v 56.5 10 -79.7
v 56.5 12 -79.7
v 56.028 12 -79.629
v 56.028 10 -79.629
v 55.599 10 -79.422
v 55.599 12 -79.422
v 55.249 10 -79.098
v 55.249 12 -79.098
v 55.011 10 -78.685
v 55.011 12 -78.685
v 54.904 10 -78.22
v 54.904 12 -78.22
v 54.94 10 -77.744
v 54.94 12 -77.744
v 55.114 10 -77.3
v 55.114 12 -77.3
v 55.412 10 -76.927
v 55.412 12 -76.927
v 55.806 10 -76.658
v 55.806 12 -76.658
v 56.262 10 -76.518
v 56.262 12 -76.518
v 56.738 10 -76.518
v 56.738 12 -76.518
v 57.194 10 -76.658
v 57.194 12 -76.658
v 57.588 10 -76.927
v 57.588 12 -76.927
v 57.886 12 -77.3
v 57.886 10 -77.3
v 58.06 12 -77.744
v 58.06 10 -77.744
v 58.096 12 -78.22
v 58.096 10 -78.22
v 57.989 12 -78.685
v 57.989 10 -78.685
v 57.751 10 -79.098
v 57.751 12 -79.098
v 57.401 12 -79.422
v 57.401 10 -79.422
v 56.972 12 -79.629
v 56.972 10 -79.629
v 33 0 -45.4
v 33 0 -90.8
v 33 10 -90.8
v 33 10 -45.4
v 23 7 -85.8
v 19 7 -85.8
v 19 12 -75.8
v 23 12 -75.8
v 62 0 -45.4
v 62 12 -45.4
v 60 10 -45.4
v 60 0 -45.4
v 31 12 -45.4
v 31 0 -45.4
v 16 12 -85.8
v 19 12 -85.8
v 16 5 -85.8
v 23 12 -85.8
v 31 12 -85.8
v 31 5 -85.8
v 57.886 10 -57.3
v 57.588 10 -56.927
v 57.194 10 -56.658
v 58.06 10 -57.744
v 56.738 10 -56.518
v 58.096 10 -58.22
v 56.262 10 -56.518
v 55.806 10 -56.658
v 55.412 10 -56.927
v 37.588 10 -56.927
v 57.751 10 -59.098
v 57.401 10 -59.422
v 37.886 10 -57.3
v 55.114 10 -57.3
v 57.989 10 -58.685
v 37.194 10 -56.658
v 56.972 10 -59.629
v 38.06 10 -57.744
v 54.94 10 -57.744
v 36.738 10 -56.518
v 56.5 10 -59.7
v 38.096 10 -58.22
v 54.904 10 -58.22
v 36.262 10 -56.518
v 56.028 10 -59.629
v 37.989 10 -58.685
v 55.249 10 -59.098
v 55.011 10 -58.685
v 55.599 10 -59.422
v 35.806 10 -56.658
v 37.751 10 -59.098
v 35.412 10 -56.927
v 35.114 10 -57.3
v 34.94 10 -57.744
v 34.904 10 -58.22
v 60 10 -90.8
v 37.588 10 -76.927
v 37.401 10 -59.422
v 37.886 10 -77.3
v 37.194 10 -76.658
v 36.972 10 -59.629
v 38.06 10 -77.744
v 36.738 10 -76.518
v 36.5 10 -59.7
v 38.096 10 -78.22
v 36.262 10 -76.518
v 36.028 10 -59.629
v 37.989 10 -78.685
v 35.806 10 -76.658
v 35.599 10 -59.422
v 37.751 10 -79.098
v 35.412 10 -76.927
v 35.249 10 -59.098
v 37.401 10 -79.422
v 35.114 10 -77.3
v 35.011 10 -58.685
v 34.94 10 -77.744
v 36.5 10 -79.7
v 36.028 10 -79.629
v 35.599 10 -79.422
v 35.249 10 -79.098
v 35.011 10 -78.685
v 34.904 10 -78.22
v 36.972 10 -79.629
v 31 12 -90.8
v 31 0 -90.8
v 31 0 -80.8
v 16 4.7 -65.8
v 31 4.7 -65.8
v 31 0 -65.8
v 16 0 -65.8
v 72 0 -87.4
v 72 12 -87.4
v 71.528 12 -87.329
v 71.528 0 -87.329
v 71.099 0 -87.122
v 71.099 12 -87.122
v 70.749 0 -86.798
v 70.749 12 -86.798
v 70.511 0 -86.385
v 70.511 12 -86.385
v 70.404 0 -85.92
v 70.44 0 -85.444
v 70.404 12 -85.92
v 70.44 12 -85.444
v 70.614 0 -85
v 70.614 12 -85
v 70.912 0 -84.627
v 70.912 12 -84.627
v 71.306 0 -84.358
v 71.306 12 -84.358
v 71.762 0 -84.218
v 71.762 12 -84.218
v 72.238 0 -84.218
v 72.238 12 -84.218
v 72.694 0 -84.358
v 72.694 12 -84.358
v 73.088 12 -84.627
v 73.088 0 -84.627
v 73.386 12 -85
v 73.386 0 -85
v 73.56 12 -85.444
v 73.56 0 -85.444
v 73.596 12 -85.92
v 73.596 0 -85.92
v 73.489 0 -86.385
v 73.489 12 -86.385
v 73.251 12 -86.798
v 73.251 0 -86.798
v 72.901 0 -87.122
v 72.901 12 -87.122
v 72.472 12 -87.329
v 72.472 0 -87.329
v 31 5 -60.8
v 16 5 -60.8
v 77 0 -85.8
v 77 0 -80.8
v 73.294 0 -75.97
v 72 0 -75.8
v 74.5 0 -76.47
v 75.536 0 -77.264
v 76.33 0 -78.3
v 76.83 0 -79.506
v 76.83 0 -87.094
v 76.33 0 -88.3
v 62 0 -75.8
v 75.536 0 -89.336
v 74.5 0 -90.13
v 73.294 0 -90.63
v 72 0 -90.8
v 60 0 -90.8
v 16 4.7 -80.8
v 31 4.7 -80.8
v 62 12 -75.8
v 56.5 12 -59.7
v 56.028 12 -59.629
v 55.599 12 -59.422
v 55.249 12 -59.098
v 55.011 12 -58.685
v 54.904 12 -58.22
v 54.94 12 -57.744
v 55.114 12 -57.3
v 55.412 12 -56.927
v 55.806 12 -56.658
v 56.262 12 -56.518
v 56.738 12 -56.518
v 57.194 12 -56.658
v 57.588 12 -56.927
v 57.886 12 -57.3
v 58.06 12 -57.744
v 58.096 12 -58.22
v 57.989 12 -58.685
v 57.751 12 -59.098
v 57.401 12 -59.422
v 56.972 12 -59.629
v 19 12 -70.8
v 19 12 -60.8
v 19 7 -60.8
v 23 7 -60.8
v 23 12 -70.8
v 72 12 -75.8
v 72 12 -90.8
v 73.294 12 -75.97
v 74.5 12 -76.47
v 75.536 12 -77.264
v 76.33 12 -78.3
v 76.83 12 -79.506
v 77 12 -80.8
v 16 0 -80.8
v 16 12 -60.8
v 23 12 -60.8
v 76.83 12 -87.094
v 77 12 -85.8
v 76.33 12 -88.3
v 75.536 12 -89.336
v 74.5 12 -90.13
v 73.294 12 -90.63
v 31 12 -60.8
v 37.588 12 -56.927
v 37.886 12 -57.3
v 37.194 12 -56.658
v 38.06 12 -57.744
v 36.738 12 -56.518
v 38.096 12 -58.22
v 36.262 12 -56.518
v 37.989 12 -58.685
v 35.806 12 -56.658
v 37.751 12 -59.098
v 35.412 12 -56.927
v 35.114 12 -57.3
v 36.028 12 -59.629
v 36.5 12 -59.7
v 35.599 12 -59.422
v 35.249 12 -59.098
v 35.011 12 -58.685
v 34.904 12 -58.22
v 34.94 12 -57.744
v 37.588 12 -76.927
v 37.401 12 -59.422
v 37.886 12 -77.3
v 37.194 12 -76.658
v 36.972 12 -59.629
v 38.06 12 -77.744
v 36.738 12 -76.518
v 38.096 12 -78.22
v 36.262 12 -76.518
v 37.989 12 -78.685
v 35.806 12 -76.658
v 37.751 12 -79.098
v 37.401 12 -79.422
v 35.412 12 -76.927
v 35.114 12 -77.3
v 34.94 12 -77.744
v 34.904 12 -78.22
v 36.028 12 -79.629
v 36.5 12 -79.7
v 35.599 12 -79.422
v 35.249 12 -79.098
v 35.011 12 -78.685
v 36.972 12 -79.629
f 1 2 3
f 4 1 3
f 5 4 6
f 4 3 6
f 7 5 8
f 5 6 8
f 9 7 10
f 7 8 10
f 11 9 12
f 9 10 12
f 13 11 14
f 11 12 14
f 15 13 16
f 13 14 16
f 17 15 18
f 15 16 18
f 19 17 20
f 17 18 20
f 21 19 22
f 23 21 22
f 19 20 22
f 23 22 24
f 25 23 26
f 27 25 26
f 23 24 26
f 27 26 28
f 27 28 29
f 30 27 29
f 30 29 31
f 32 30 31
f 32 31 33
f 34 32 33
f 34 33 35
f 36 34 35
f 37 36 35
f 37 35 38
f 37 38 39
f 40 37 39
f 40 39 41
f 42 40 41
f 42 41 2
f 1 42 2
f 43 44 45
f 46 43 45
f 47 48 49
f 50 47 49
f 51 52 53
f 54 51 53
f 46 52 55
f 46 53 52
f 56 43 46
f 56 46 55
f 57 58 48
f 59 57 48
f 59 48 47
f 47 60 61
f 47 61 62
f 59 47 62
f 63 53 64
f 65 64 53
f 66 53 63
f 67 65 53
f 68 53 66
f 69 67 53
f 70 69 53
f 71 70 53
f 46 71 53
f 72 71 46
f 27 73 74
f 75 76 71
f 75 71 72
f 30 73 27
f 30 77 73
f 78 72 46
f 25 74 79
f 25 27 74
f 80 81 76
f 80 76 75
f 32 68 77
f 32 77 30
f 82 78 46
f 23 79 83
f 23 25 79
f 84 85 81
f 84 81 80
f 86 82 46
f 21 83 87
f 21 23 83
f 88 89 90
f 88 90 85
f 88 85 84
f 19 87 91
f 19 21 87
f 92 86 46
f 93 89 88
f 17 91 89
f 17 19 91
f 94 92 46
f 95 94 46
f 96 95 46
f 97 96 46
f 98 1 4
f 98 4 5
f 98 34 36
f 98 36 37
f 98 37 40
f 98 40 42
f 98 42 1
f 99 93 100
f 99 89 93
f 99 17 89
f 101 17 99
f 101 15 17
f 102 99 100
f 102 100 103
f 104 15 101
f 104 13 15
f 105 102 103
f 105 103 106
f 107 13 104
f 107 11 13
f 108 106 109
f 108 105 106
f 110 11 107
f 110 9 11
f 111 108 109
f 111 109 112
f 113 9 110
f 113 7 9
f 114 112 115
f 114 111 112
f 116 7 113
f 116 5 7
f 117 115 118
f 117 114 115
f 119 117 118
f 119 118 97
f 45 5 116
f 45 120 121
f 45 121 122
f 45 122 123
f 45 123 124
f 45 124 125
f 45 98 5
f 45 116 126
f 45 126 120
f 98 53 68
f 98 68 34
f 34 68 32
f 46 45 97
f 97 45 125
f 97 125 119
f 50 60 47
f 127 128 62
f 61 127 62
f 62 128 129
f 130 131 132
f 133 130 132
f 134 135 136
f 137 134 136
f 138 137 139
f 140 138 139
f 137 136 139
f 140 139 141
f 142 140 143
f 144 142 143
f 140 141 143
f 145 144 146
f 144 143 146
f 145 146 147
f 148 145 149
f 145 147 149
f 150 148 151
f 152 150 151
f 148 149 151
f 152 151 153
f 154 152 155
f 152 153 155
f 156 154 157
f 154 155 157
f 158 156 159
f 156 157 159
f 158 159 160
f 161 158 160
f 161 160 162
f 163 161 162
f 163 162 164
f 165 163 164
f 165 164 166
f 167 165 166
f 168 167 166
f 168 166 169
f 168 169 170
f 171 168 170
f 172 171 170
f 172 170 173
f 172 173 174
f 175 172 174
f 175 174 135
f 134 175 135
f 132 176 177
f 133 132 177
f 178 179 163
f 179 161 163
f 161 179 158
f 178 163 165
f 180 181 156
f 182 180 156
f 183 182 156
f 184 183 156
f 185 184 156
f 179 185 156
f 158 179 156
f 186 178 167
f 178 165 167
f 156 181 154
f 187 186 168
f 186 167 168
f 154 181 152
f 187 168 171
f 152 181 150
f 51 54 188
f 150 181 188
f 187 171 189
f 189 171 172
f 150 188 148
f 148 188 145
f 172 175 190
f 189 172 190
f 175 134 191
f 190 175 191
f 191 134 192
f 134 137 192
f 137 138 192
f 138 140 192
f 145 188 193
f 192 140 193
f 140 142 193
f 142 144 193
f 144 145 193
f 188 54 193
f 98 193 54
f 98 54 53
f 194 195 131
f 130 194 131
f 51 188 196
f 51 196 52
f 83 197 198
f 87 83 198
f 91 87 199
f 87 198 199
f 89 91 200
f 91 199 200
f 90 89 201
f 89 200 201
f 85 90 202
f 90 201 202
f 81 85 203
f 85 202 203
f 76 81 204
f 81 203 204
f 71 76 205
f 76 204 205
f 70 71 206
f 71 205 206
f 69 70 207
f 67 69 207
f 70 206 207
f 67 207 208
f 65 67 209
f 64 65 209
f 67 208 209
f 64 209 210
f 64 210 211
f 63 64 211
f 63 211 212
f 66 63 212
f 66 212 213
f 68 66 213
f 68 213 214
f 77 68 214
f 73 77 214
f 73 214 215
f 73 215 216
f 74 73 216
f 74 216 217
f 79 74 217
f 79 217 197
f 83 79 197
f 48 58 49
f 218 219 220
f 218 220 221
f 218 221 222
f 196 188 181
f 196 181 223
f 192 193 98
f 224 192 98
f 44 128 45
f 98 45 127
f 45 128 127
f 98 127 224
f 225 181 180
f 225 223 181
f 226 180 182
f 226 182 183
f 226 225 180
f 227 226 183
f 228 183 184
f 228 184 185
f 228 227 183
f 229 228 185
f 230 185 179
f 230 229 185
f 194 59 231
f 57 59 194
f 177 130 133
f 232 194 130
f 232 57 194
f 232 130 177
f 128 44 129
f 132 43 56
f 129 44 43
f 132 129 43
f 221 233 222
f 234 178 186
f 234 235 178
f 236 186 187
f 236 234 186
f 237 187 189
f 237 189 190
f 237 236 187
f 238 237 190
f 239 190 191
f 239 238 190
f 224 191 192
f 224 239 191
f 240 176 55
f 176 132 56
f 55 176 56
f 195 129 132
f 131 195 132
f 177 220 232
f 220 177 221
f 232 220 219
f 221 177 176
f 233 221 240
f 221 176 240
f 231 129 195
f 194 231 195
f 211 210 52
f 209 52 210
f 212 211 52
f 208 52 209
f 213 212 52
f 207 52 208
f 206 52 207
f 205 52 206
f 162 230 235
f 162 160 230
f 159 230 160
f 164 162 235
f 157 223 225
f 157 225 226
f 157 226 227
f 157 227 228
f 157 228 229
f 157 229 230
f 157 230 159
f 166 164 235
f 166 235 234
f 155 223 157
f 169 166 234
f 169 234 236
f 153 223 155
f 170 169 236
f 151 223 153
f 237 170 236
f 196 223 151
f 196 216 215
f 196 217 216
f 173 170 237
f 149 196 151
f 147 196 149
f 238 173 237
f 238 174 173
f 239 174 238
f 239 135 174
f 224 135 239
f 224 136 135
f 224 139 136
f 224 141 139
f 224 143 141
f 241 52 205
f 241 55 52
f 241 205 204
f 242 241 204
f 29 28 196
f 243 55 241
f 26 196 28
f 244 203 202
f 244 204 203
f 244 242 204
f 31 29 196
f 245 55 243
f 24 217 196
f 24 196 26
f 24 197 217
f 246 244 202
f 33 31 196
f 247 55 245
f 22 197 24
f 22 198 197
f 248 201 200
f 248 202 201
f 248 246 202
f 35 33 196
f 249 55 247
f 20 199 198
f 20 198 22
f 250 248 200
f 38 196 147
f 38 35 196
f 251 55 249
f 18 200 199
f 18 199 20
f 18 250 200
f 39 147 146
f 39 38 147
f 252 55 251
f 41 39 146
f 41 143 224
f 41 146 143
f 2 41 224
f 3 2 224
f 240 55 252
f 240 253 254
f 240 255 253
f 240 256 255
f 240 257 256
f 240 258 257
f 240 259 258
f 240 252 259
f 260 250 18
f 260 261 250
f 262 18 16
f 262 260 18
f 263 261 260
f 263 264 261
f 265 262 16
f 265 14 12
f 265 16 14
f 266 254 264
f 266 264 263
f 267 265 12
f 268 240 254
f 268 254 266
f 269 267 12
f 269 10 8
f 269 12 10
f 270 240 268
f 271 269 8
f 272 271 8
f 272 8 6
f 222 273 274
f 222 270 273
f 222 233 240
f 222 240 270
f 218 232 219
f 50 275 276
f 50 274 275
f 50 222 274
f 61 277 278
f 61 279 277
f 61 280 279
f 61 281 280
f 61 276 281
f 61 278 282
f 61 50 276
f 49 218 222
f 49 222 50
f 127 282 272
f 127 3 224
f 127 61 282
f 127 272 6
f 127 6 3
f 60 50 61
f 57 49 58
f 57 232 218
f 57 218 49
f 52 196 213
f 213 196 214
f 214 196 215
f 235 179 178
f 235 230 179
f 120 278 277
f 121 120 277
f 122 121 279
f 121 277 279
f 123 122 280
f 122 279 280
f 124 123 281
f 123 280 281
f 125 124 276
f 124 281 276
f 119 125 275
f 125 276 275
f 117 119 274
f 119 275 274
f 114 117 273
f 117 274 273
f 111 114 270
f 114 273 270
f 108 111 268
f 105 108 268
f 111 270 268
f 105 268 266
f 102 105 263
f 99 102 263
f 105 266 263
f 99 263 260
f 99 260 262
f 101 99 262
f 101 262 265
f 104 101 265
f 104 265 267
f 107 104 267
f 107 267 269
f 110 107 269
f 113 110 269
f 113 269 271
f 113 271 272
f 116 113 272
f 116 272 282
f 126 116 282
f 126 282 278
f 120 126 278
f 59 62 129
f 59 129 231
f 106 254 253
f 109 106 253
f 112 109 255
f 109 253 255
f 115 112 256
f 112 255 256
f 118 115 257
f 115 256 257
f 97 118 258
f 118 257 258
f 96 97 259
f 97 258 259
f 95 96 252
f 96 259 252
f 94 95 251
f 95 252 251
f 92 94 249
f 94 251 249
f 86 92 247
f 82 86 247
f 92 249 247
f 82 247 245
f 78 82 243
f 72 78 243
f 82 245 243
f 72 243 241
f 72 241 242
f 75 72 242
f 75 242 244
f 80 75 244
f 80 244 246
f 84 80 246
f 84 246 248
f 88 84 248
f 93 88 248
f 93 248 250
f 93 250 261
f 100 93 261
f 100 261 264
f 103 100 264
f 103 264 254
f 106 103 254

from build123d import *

# Parameters (mm, degrees)
SKETCH1_W           = 31
SKETCH1_H           = 45.4
BOSS_EXTRUDE1_DEPTH = 12
SKETCH2_W           = 27
SKETCH2_H           = 10
CUT_EXTRUDE1_DEPTH  = 57.268641356
SKETCH3_R           = 1.6
CUT_EXTRUDE2_DEPTH  = 10
SKETCH4_W           = 15
SKETCH4_H           = 12
BOSS_EXTRUDE2_DEPTH = 15
SKETCH5_R           = 1.6
CUT_EXTRUDE3_DEPTH  = 20
FILLET1_R           = 5
BOSS_EXTRUDE3_DEPTH = 15
CHAMFER1_SIZE       = 5
CUT_EXTRUDE4_DEPTH  = 4


with BuildPart() as part:
    # Sketch1 → Boss-Extrude1 (new body)
    with BuildSketch(Plane(origin=(0, 0, 0), x_dir=(1, 0, 0), z_dir=(0, 1, 0))):
        with Locations((15.5, 22.7)):
            Rectangle(SKETCH1_W, SKETCH1_H)
    extrude(amount=BOSS_EXTRUDE1_DEPTH)

    # Sketch2 → Cut-Extrude1 (cut, through all)
    with BuildSketch(Plane.XY):
        with Locations((15.5, 5)):
            Rectangle(SKETCH2_W, SKETCH2_H)
    extrude(amount=-CUT_EXTRUDE1_DEPTH, mode=Mode.SUBTRACT)

    # Sketch3 → Cut-Extrude2 (cut)
    with BuildSketch(Plane(origin=(0, 12, 0), x_dir=(1, 0, 0), z_dir=(0, 1, 0))):
        with Locations(Location((5.5, 32.7, 0), (0, 0, 270))):
            Circle(SKETCH3_R)
        with Locations(Location((25.5, 32.7, 0), (0, 0, 270))):
            Circle(SKETCH3_R)
        with Locations(Location((25.5, 12.7, 0), (0, 0, 270))):
            Circle(SKETCH3_R)
        with Locations(Location((5.5, 12.7, 0), (0, 0, 270))):
            Circle(SKETCH3_R)
    extrude(amount=-CUT_EXTRUDE2_DEPTH, mode=Mode.SUBTRACT)

    # Sketch4 → Boss-Extrude2 (add)
    with BuildSketch(Plane.ZY):
        with Locations((-7.5, 6)):
            Rectangle(SKETCH4_W, SKETCH4_H)
    extrude(amount=BOSS_EXTRUDE2_DEPTH)

    # Sketch5 → Cut-Extrude3 (cut)
    with BuildSketch(Plane(origin=(0, 12, 0), x_dir=(1, 0, 0), z_dir=(0, 1, 0))):
        with Locations(Location((-10, 5, 0), (0, 0, 270))):
            Circle(SKETCH5_R)
    extrude(amount=-CUT_EXTRUDE3_DEPTH, mode=Mode.SUBTRACT)

    # Fillet1
    fillet1_edges = [part.edges().sort_by_distance(p)[0] for p in [
        (-15, 6, -15),
        (-15, 6, 0),
    ]]
    fillet(fillet1_edges, radius=FILLET1_R)

    # Sketch6 → Boss-Extrude3 (add)
    with BuildSketch(Plane(origin=(31, 0, 0), x_dir=(0, 0, -1), z_dir=(1, 0, 0))):
        Polygon((5, 0), (10, 0), (10, 4.7), (25, 4.7), (25, 0), (30, 0), (30, 12), (5, 12), align=None)
    extrude(amount=BOSS_EXTRUDE3_DEPTH)

    # Chamfer1
    chamfer1_edges = [part.edges().sort_by_distance(p)[0] for p in [
        (38.5, 0, -5),
        (38.5, 0, -30),
    ]]
    chamfer(chamfer1_edges, length=CHAMFER1_SIZE - 0.0001)  # a hair under: the kernel refuses the full size

    # Sketch7 → Cut-Extrude4 (cut)
    with BuildSketch(Plane(origin=(43, 0, 0), x_dir=(0, 0, -1), z_dir=(1, 0, 0))):
        Polygon((5, 7), (15, 12), (5, 12), align=None)
        Polygon((30, 7), (20, 12), (30, 12), align=None)
    extrude(amount=-CUT_EXTRUDE4_DEPTH, mode=Mode.SUBTRACT)


with BuildPart() as body_2:
    # Mirror2: mirrored copy
    add(part.part.mirror(Plane(origin=(31, 12, 0), x_dir=(0, 0, 1), z_dir=(-1, 0, 0))))


with BuildPart() as body_3:
    # Mirror3: mirrored copy
    add(body_2.part.mirror(Plane(origin=(62, 12, -45.4), x_dir=(1, 0, 0), z_dir=(0, 0, 1))))


solid = body_3.part
